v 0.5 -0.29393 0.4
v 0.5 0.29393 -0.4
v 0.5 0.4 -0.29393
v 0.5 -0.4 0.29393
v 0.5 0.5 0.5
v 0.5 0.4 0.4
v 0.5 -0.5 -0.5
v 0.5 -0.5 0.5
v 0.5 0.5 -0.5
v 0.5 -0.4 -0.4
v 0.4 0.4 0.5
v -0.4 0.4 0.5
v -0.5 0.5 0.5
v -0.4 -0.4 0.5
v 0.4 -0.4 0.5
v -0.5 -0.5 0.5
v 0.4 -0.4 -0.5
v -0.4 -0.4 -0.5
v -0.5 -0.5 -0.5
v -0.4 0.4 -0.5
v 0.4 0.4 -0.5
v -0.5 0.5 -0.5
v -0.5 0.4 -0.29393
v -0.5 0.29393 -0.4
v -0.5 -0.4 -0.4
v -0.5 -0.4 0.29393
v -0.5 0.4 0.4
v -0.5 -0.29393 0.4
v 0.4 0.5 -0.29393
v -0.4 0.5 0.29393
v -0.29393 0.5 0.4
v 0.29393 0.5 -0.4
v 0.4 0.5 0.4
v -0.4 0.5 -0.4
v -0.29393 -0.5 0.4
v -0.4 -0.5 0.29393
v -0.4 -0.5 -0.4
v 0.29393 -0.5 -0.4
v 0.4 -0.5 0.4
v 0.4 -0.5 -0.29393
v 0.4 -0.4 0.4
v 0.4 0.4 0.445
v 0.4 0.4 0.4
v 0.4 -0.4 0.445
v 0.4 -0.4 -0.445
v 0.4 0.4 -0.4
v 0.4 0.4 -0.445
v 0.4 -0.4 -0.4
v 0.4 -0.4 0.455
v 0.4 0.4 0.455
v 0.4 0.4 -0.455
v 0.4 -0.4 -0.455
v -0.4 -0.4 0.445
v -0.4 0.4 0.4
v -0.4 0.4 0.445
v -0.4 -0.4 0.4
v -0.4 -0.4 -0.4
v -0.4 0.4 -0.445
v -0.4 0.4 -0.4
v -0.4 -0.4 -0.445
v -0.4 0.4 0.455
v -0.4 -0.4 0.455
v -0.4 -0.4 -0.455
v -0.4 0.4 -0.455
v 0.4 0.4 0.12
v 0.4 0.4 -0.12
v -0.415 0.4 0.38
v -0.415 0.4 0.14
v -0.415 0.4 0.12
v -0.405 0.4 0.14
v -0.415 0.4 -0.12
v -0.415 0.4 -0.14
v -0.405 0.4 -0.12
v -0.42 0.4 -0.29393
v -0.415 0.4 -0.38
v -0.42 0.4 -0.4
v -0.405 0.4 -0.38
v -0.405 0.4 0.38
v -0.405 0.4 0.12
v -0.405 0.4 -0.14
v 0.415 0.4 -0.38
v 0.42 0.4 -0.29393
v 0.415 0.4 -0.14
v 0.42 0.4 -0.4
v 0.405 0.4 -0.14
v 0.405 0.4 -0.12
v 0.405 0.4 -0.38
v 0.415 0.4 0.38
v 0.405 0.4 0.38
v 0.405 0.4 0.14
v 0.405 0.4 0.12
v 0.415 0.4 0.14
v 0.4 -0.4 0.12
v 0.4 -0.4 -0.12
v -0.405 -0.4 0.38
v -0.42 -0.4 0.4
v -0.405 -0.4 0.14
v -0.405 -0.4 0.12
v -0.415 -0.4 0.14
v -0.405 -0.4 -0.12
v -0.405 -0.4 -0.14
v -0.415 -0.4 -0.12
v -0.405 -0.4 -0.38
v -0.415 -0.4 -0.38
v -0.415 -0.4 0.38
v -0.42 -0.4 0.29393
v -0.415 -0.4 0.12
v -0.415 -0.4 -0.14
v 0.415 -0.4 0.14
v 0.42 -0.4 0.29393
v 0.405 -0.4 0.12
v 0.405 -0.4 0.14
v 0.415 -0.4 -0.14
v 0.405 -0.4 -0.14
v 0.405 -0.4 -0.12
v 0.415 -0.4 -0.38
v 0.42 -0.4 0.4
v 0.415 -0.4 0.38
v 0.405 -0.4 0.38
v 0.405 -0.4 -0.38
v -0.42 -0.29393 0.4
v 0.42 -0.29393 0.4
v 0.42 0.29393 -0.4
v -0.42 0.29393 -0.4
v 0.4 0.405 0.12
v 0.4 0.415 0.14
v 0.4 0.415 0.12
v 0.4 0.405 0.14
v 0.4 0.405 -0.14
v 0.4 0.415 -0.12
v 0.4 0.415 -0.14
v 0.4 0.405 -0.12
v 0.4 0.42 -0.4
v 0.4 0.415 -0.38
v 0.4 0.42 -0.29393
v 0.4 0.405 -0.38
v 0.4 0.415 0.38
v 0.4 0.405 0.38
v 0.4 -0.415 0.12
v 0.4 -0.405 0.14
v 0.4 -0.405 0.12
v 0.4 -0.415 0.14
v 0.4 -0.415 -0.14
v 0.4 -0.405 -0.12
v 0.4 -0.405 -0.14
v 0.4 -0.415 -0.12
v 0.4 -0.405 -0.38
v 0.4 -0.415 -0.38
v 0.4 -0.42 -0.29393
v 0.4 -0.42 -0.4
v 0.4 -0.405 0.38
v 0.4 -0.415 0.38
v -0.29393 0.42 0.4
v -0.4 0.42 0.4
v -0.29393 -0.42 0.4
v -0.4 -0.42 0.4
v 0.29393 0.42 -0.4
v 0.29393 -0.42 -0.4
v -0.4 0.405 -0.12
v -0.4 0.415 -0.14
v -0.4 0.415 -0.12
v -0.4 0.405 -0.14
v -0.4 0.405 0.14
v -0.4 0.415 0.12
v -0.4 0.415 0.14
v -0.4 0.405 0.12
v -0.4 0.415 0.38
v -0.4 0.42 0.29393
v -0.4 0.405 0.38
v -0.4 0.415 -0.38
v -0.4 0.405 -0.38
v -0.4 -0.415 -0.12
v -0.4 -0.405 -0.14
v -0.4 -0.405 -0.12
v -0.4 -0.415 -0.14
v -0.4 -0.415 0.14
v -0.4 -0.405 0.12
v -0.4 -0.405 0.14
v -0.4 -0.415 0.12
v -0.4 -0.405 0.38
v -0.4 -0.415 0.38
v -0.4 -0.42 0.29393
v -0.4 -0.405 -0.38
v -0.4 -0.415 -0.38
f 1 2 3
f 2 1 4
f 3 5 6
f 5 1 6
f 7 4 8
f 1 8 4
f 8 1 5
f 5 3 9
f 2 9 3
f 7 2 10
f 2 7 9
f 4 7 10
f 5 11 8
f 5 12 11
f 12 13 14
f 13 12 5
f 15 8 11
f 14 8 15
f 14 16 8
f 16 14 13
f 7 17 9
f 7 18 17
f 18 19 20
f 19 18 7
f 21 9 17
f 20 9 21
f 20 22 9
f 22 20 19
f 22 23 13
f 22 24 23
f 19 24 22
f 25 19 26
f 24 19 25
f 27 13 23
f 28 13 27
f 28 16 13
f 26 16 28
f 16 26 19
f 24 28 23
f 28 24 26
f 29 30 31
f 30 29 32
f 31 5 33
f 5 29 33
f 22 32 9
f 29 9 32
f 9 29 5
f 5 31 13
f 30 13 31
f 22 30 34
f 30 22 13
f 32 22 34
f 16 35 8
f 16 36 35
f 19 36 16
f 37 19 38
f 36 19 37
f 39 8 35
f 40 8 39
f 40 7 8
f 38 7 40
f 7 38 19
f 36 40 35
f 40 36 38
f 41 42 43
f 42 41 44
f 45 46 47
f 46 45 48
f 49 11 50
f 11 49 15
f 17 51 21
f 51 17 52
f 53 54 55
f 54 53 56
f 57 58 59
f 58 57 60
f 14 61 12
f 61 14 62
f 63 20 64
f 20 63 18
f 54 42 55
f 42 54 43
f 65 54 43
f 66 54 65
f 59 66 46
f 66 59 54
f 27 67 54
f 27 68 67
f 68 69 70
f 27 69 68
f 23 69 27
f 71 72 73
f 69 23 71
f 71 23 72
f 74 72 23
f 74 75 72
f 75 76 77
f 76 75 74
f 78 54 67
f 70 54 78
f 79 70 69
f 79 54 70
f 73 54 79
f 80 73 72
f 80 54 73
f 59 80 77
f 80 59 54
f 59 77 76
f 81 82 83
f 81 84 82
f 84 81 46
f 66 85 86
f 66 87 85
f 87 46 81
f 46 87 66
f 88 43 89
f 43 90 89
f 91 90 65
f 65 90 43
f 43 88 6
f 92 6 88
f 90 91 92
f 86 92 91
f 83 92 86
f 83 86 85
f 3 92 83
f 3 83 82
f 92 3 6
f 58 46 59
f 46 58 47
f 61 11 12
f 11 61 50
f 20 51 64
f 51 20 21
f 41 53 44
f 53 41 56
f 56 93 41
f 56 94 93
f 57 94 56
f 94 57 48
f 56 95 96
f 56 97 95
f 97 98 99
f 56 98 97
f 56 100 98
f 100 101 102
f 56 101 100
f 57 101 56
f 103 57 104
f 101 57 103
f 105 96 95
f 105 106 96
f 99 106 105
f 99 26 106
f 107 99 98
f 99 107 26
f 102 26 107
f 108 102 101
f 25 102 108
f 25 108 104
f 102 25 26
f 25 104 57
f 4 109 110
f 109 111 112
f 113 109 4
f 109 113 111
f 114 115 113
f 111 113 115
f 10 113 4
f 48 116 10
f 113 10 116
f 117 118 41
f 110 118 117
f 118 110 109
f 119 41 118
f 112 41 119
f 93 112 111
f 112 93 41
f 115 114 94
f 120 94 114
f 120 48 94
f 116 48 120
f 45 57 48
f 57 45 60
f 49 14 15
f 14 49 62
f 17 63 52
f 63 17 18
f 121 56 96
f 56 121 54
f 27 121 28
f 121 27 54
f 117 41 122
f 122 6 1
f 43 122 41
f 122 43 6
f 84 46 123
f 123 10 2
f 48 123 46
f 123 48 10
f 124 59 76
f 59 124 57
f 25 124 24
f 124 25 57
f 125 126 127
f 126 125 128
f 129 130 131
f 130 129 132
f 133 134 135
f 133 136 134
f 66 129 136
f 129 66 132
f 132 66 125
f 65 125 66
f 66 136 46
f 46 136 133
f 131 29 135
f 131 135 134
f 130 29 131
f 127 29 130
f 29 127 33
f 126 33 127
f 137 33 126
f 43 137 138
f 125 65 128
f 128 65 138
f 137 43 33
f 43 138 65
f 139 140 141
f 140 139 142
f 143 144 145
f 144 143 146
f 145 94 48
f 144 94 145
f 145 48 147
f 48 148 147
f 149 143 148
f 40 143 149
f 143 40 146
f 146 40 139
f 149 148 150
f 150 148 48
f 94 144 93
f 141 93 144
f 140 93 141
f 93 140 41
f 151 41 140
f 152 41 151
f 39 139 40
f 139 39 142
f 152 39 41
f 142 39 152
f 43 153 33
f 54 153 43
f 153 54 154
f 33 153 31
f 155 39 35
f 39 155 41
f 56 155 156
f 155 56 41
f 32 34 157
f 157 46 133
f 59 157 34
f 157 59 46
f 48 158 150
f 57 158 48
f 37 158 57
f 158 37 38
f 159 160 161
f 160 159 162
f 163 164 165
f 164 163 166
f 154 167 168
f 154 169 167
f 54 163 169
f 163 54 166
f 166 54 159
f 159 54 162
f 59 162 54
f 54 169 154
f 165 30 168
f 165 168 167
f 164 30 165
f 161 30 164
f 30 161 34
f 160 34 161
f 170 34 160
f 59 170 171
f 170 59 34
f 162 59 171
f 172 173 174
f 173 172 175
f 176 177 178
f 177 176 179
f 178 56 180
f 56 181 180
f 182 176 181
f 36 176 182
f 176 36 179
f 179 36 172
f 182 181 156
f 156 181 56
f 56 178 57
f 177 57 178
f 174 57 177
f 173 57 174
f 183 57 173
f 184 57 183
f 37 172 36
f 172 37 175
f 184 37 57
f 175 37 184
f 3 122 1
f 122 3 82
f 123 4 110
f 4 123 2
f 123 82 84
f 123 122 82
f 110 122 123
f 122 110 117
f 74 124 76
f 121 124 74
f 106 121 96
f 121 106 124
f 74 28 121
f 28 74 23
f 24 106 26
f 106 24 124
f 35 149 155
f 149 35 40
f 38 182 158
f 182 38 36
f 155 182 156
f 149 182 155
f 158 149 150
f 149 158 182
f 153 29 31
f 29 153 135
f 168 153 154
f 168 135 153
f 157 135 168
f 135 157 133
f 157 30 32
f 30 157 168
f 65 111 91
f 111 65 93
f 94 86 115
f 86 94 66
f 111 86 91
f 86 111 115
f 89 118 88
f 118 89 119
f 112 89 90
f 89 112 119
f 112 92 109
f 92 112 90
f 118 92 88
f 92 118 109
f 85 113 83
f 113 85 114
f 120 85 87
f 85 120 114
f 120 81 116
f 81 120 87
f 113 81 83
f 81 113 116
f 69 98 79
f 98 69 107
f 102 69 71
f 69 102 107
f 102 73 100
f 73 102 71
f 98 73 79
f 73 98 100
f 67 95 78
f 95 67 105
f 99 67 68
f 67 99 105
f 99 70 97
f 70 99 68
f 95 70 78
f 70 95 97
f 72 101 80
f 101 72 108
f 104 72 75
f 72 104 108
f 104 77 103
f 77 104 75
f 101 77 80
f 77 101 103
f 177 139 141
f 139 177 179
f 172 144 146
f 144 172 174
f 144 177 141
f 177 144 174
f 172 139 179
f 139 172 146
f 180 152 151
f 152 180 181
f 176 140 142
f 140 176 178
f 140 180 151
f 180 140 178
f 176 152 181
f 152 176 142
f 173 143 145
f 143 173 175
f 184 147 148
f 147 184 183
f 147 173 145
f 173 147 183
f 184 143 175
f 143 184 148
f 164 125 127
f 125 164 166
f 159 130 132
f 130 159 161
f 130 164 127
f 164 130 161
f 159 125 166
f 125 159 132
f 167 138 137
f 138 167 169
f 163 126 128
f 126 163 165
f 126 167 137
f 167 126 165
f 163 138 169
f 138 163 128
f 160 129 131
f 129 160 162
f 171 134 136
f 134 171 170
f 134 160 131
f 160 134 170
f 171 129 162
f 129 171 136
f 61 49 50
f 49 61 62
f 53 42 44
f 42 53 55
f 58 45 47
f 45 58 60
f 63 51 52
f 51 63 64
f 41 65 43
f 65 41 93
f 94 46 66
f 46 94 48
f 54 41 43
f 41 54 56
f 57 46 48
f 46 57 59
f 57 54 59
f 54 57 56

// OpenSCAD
module Wood_Crate(){
    union(){
    color("#c69874"){
    difference(){

    cube([1,1,1], center = true);

    cube([0.8,0.8,2], center = true);

    cube([2,0.8,0.8], center = true);

    cube([0.8,2,0.8], center = true);

    }

    translate([0.46,-0.,0])
    rotate([-45,0,0])
    cube([0.08,1.2,0.15], center = true);

    translate([-0.46,-0,0])
    rotate([-45,0,0])
    cube([0.08,1.2,0.15], center = true);

    translate([0,-0.46,0])
    rotate([45,0,90])
    cube([0.08,1.2,0.15], center = true);

    translate([0,0.46,0])
    rotate([45,0,90])
    cube([0.08,1.2,0.15], center = true);

    }
    }

    color("black"){
    cube([0.8,0.8,0.8], center = true);
    }

    color("#bc6a3c"){
    translate([0.4,0,0.0])
    rotate([0,0,90])
    cube([0.8,0.01,0.24], center = true);

    translate([0.41,0,0.26])
    rotate([0,0,90])
    cube([0.8,0.01,0.24], center = true);

    translate([0.41,0,-0.26])
    rotate([0,0,90])
    cube([0.8,0.01,0.24], center = true);


    translate([-0.41,0,0.0])
    rotate([0,0,90])
    cube([0.8,0.01,0.24], center = true);

    translate([-0.41,0,0.26])
    rotate([0,0,90])
    cube([0.8,0.01,0.24], center = true);

    translate([-0.41,0,-0.26])
    rotate([0,0,90])
    cube([0.8,0.01,0.24], center = true);



    translate([0,-0.41,0.0])
    rotate([0,0,0])
    cube([0.8,0.01,0.24], center = true);

    translate([0,-0.41,0.26])
    rotate([0,0,0])
    cube([0.8,0.01,0.24], center = true);

    translate([0,-0.41,-0.26])
    rotate([0,0,0])
    cube([0.8,0.01,0.24], center = true);

    translate([0,0.41,0.0])
    rotate([0,0,0])
    cube([0.8,0.01,0.24], center = true);

    translate([0,0.41,0.26])
    rotate([0,0,0])
    cube([0.8,0.01,0.24], center = true);

    translate([0,0.41,-0.26])
    rotate([0,0,0])
    cube([0.8,0.01,0.24], center = true);

    translate([0,0,0.45])
    cube([0.8,0.8,0.01], center = true);

    translate([0,0,-0.45])
    cube([0.8,0.8,0.01], center = true);
    }
}

Wood_Crate();


// Written by Nicolì Angelo (Gengio) 2024: 
// MIT License

//Permission is hereby granted, free of charge, to any person obtaining a copy of this software and associated documentation files (the "Software"), to deal in the Software without restriction, including without limitation the rights to use, copy, modify, merge, publish, distribute, sublicense, and/or sell copies of the Software, and to permit persons to whom the Software is furnished to do so, subject to the following conditions:

//The above copyright notice and this permission notice shall be included in all copies or substantial portions of the Software.

//THE SOFTWARE IS PROVIDED "AS IS", WITHOUT WARRANTY OF ANY KIND, EXPRESS OR IMPLIED, INCLUDING BUT NOT LIMITED TO THE WARRANTIES OF MERCHANTABILITY, FITNESS FOR A PARTICULAR PURPOSE AND NONINFRINGEMENT. IN NO EVENT SHALL THE AUTHORS OR COPYRIGHT HOLDERS BE LIABLE FOR ANY CLAIM, DAMAGES OR OTHER LIABILITY, WHETHER IN AN ACTION OF CONTRACT, TORT OR OTHERWISE, ARISING FROM, OUT OF OR IN CONNECTION WITH THE SOFTWARE OR THE USE OR OTHER DEALINGS IN THE SOFTWARE.
